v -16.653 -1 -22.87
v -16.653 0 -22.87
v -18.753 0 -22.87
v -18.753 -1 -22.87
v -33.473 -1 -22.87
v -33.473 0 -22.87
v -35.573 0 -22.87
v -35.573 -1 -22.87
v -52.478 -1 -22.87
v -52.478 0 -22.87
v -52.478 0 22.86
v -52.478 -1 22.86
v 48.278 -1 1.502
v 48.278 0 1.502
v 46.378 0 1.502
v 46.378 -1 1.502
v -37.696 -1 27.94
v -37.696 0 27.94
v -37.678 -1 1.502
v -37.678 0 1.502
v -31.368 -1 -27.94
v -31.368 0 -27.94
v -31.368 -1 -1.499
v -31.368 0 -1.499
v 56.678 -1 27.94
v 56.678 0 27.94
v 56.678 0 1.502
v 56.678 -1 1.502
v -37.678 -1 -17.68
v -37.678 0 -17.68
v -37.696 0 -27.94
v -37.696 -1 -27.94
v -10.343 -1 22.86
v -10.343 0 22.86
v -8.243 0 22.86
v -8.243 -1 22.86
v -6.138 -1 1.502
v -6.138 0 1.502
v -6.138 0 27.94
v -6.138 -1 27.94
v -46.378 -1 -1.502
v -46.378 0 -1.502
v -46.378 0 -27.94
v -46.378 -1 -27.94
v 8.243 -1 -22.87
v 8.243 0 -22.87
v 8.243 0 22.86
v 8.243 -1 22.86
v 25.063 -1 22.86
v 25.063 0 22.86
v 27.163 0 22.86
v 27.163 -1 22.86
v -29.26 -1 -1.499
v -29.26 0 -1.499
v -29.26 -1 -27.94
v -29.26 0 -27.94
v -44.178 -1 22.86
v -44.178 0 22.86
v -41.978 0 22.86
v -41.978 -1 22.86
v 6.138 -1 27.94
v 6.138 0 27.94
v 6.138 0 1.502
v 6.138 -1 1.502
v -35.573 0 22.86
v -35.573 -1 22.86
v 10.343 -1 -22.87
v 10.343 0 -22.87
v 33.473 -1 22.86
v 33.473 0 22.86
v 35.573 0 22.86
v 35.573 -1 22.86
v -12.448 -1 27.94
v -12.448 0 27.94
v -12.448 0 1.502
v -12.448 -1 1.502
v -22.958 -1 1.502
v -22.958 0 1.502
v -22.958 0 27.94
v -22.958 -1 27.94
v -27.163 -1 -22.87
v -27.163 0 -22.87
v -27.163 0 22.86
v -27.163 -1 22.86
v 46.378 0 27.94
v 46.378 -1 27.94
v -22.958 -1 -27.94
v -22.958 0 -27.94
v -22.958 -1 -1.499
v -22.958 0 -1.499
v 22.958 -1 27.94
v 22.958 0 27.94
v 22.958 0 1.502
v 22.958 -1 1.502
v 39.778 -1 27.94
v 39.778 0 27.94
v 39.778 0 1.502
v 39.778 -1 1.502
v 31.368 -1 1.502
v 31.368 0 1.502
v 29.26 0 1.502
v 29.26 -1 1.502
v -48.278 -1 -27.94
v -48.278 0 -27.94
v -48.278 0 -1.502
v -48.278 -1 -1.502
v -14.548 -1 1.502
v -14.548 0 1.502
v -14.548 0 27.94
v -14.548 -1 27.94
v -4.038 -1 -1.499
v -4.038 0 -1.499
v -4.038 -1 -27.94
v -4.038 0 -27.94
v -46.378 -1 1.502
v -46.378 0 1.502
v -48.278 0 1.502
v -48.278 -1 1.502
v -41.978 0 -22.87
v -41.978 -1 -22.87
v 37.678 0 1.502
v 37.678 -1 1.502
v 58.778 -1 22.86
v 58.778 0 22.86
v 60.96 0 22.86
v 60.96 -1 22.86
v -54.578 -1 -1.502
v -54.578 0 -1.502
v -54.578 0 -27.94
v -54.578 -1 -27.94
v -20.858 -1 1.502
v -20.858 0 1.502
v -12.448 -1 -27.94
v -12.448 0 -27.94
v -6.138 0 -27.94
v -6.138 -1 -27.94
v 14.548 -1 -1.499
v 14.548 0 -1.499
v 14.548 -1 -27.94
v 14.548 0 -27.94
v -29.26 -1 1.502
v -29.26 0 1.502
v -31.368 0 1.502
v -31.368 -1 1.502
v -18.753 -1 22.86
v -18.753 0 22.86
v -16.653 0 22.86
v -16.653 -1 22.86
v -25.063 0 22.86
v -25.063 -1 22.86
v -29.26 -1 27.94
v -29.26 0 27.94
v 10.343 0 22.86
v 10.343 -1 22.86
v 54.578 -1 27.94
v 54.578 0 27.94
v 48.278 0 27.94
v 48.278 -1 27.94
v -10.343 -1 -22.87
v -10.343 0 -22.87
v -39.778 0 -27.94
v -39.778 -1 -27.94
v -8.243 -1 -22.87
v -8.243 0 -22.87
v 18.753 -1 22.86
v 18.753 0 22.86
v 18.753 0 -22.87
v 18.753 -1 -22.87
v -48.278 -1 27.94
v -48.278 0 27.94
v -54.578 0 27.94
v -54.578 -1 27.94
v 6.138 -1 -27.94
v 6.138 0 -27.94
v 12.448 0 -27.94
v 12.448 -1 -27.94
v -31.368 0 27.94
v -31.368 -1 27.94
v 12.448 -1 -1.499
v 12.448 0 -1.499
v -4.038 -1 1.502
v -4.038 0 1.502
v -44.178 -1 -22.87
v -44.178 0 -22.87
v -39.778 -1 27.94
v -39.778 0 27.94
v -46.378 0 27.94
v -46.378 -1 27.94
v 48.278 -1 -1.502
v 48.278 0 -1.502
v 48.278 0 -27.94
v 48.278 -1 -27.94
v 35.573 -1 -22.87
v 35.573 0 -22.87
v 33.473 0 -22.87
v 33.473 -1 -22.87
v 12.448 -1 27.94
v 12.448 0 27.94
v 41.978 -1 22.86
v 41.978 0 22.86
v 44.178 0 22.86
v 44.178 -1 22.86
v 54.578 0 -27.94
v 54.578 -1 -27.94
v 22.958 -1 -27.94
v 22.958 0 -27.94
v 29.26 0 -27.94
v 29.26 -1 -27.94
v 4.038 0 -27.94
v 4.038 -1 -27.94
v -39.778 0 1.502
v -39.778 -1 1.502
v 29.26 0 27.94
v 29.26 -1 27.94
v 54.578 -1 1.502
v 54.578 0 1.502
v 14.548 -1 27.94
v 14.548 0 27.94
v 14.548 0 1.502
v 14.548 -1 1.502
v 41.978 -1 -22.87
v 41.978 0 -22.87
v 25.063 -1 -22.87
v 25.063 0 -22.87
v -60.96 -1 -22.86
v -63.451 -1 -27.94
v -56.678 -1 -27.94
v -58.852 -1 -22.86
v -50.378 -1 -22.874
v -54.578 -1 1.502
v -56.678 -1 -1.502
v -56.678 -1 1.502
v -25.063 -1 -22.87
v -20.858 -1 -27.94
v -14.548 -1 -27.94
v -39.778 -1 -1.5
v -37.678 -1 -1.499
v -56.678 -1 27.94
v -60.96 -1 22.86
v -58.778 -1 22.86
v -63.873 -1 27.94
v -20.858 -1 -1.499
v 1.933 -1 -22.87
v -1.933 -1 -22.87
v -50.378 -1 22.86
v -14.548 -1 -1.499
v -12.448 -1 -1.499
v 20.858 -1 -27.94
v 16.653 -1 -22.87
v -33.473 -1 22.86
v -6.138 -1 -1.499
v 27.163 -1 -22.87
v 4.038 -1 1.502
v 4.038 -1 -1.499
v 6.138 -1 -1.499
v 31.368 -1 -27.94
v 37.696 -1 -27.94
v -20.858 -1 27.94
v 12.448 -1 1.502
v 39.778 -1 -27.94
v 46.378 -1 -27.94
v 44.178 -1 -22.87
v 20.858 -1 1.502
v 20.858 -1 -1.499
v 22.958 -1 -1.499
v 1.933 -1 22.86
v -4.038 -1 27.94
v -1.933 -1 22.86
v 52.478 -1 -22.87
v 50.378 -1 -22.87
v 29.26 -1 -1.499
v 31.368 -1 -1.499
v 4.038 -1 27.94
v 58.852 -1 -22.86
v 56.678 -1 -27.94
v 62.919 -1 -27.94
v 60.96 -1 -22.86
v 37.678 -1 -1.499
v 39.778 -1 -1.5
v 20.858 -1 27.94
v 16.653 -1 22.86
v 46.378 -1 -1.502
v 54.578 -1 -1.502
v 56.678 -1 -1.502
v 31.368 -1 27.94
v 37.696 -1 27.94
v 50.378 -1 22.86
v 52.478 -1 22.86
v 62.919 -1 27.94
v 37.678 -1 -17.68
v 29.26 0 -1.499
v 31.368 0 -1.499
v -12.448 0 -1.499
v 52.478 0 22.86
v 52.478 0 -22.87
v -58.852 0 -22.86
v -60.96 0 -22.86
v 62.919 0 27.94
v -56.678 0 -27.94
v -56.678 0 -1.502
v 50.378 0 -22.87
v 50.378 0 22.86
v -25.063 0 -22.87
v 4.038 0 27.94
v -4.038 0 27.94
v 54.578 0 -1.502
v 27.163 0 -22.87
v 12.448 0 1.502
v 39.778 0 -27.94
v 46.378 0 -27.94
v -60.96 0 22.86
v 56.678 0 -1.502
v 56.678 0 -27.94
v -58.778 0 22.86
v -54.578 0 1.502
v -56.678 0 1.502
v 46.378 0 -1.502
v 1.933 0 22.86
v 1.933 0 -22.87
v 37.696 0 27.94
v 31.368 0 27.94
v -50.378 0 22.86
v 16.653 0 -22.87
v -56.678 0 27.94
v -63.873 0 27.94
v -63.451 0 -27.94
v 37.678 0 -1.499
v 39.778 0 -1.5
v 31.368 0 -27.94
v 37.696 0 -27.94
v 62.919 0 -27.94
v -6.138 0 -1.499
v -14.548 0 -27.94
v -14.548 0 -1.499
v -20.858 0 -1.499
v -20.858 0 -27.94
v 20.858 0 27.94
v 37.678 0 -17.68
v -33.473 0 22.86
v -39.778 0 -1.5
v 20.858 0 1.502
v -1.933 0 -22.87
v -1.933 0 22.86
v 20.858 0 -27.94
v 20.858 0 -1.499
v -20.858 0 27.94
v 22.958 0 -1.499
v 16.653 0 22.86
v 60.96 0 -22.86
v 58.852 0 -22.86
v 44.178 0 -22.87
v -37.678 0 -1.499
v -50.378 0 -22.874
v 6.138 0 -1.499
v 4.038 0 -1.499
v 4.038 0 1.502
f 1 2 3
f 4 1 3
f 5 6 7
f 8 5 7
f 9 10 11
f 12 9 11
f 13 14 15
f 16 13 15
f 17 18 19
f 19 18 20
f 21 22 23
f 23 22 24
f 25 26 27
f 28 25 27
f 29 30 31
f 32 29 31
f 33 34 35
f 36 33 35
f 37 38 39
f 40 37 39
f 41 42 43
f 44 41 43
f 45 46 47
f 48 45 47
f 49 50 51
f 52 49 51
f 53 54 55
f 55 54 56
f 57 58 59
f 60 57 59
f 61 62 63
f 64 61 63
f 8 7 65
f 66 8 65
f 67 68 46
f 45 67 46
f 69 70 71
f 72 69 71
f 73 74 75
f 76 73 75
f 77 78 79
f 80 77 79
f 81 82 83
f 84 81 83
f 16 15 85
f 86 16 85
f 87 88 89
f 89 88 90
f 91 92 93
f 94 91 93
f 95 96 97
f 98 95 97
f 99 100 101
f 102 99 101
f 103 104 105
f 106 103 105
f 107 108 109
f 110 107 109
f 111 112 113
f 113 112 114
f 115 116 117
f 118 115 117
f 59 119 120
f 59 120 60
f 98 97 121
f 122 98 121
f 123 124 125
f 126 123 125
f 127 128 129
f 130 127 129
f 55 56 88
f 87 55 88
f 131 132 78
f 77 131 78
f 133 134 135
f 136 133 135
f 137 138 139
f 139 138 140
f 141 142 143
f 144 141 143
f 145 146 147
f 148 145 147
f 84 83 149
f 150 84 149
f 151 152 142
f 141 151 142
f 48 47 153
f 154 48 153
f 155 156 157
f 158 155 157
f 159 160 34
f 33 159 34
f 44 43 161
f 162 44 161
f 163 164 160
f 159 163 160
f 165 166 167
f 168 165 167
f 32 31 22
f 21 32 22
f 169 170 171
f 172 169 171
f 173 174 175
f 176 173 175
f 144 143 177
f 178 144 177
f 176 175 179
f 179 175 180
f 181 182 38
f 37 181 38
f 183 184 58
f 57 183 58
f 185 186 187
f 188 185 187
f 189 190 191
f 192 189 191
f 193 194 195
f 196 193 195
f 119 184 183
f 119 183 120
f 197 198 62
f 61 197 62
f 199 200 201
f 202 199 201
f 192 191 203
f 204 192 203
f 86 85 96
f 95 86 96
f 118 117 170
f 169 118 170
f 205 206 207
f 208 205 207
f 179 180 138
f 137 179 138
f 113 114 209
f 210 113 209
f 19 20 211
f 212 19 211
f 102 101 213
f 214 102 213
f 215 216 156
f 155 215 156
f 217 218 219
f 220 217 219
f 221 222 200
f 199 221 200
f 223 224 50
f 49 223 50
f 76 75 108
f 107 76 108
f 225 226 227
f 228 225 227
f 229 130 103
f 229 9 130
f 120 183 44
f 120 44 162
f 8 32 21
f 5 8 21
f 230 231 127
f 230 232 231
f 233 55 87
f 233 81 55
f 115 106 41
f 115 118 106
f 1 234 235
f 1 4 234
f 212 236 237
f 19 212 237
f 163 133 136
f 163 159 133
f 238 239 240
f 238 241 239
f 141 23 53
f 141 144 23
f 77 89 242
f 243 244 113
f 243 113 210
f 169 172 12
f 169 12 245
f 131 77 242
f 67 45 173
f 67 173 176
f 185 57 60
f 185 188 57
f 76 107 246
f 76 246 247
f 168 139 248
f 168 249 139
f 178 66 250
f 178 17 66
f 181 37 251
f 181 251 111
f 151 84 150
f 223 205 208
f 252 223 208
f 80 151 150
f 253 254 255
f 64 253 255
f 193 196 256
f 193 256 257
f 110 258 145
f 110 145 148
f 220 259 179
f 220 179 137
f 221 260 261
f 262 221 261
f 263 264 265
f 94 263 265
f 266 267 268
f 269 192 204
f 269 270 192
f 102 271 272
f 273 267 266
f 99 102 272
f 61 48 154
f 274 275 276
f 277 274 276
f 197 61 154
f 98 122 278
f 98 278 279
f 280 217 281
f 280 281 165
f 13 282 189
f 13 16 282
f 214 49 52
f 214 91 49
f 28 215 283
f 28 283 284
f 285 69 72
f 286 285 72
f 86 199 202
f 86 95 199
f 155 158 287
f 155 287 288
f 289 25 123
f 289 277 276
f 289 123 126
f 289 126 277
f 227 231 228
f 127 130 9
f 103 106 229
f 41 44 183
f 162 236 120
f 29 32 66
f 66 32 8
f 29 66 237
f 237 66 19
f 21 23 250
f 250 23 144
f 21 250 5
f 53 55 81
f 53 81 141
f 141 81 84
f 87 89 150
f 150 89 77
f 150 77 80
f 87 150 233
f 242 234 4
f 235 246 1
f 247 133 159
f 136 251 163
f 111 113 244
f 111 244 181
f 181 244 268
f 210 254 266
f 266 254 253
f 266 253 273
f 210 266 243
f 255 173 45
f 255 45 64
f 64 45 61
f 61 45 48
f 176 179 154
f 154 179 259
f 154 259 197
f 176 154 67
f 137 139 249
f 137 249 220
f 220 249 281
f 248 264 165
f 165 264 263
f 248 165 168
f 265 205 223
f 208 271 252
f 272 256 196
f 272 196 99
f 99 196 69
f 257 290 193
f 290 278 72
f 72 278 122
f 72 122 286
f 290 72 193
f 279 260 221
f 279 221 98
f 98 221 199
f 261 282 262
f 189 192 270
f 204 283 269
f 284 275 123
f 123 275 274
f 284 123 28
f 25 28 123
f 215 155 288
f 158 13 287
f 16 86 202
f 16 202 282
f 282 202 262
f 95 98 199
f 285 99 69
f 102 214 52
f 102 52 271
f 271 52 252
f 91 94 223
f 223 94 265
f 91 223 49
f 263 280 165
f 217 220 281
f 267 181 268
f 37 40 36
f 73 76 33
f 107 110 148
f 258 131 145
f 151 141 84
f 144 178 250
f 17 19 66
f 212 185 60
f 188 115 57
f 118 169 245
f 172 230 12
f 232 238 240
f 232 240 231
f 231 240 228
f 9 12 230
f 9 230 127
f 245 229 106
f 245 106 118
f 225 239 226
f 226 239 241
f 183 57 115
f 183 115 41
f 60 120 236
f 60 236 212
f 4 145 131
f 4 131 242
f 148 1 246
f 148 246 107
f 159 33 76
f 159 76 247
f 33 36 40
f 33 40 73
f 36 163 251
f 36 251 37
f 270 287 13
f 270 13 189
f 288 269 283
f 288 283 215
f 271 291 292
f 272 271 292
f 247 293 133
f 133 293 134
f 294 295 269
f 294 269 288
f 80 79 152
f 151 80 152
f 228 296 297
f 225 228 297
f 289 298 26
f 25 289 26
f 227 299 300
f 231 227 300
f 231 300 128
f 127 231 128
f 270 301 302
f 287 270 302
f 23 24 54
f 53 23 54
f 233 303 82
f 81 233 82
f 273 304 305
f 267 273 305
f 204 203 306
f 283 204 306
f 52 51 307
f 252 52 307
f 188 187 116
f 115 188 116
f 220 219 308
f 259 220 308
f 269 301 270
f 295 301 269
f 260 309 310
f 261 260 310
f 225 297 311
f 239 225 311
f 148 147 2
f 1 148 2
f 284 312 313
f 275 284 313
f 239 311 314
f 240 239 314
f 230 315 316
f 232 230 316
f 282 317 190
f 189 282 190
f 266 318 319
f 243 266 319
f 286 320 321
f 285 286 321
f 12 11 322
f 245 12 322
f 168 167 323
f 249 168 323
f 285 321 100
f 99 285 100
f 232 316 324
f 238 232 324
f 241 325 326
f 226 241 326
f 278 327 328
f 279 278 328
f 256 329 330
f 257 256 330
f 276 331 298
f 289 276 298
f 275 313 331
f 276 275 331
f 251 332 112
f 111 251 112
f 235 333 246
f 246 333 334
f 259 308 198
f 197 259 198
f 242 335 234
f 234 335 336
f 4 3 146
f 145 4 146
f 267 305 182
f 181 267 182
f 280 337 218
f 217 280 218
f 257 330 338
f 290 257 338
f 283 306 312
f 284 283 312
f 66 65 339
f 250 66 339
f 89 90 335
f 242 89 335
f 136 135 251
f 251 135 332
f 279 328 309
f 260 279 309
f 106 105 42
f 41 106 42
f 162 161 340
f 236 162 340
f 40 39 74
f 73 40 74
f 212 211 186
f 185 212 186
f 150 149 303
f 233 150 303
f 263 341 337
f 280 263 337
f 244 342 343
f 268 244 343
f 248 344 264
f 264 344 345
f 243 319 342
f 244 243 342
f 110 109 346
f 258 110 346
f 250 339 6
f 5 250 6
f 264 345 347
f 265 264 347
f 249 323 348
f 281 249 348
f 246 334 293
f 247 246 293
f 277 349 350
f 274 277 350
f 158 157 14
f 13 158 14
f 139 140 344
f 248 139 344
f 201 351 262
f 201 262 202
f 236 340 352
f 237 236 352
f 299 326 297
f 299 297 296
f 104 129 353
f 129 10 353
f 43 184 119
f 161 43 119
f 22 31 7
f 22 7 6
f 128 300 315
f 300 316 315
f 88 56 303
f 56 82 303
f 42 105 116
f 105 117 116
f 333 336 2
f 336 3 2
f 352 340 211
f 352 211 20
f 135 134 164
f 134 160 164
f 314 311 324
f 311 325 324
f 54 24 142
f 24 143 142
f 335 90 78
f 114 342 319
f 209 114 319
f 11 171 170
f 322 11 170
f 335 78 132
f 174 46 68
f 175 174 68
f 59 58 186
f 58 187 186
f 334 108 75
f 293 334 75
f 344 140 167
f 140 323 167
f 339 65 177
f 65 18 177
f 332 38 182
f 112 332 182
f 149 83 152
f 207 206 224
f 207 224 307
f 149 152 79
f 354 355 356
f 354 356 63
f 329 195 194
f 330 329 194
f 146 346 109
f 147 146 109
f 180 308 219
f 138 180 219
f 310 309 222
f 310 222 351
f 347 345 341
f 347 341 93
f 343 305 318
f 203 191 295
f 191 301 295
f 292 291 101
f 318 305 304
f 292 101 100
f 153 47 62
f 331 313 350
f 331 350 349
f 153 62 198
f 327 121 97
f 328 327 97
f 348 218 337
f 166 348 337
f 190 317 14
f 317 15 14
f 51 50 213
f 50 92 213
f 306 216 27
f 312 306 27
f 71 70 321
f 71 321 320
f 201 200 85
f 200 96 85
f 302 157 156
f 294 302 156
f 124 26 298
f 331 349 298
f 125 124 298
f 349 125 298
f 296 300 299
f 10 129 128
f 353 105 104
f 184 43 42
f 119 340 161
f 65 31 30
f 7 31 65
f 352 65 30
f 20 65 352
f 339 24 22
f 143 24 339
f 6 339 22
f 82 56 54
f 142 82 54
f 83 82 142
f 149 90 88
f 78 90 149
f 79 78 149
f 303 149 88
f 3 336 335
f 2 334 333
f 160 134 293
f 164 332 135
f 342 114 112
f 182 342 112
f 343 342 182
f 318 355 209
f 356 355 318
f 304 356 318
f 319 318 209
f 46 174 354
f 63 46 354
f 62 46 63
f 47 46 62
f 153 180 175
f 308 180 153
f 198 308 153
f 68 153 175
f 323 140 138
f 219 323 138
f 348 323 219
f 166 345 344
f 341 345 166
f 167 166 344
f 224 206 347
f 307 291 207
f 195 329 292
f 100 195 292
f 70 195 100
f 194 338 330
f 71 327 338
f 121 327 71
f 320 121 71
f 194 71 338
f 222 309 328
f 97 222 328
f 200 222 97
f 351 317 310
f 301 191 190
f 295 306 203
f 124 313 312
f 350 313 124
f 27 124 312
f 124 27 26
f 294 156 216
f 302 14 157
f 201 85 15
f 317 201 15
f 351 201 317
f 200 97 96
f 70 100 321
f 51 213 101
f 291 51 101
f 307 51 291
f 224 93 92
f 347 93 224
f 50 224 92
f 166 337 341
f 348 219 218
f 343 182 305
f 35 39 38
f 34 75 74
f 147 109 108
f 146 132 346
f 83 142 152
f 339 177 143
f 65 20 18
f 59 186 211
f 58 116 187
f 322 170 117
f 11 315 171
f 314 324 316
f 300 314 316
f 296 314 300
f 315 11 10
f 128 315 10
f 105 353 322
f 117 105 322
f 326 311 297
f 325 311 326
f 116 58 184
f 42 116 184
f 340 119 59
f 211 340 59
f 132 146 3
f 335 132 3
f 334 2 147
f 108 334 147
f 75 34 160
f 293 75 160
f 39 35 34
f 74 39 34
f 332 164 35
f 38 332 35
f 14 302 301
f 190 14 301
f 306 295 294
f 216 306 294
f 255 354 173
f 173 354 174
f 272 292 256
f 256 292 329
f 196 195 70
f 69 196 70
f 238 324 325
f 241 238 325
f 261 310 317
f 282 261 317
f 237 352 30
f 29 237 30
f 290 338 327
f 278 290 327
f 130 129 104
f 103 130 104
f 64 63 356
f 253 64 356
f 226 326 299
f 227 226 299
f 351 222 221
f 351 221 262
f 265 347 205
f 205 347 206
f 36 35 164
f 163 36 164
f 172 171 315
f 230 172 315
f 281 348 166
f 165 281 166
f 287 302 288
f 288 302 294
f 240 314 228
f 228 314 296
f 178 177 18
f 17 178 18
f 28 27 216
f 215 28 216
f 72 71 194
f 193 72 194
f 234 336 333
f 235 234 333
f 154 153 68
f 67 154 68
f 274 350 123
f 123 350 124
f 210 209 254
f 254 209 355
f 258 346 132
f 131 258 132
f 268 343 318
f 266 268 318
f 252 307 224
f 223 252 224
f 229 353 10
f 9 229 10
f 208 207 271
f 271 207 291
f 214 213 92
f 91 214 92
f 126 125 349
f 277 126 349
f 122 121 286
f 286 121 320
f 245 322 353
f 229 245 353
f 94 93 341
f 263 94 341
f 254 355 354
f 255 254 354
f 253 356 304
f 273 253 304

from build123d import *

# Parameters (mm, degrees)
F0_W     = 2.2
F0_H     = 45.730288
F0_W_2   = 2.1
F1_DEPTH = 1


with BuildPart() as f1:
    # F0 (on Front) → F1 (new body)
    with BuildSketch(Plane.XZ):
        Polygon((-60.96, 27.94), (-63.872576, 27.94), (-63.45094, -27.94), (-60.96, -27.94), (-58.86, -27.94), (-58.8518, -27.94), (-56.678003, -27.94), (-56.678003, -1.502051), (-54.578005, -1.502051), (-54.578005, -27.94), (-52.478005, -27.94), (-50.378005, -27.94), (-48.278005, -27.94), (-48.278005, -1.502051), (-46.378005, -1.502051), (-46.378005, -22.870288), (-46.378005, -27.94), (-44.178005, -27.94), (-41.978005, -27.94), (-39.778005, -27.94), (-39.778005, -1.5), (-37.678009, -1.4986), (-37.678009, -17.679542), (-37.695634, -27.94), (-31.367925, -27.94), (-31.367925, -1.4986), (-29.259725, -1.4986), (-29.259725, -27.94), (-22.957845, -27.94), (-22.957845, -1.4986), (-20.857845, -1.4986), (-20.857845, -27.94), (-14.547765, -27.94), (-14.547765, -1.4986), (-12.447765, -1.4986), (-12.447765, -27.94), (-6.137685, -27.94), (-6.137685, -1.4986), (-4.037685, -1.4986), (-4.037685, -27.94), (4.037685, -27.94), (4.037685, -1.4986), (6.137685, -1.4986), (6.137685, -27.94), (12.447765, -27.94), (12.447765, -1.4986), (14.547765, -1.4986), (14.547765, -27.94), (20.857845, -27.94), (20.857845, -1.4986), (22.957845, -1.4986), (22.957845, -27.94), (29.259725, -27.94), (29.259725, -1.4986), (31.367925, -1.4986), (31.367925, -27.94), (37.695634, -27.94), (37.678009, -17.679542), (37.678009, -1.4986), (39.778005, -1.5), (39.778005, -27.94), (46.378005, -27.94), (46.378005, -1.502051), (48.278005, -1.502051), (48.278005, -27.94), (54.578005, -27.94), (54.578005, -1.502051), (56.678003, -1.502051), (56.678003, -27.94), (62.918797, -27.94), (62.918797, 27.94), (56.678003, 27.94), (56.678003, 1.502051), (54.578005, 1.502051), (54.578005, 27.94), (48.278005, 27.94), (48.278005, 1.502051), (46.378005, 1.502051), (46.378005, 27.94), (39.778005, 27.94), (39.778005, 22.86), (39.778005, 1.502051), (37.678009, 1.502051), (37.695634, 27.94), (31.367925, 27.94), (31.367925, 22.86), (31.367925, 1.502051), (29.259725, 1.502051), (29.259725, 27.94), (22.957845, 27.94), (22.957845, 22.86), (22.957845, 1.502051), (20.857845, 1.502051), (20.857845, 27.94), (14.547765, 27.94), (14.547765, 22.86), (14.547765, 1.502051), (12.447765, 1.502051), (12.447765, 27.94), (6.137685, 27.94), (6.137685, 22.86), (6.137685, 1.502051), (4.037685, 1.502051), (4.037685, 27.94), (-4.037685, 27.94), (-4.037685, 1.502051), (-6.137685, 1.502051), (-6.137685, 22.86), (-6.137685, 27.94), (-12.447765, 27.94), (-12.447765, 1.502051), (-14.547765, 1.502051), (-14.547765, 22.86), (-14.547765, 27.94), (-20.857845, 27.94), (-20.857845, 1.502051), (-22.957845, 1.502051), (-22.957845, 22.86), (-22.957845, 27.94), (-29.259725, 27.94), (-29.259725, 1.502051), (-31.367925, 1.502051), (-31.367925, 22.86), (-31.367925, 27.94), (-34.921541, 27.94), (-37.695634, 27.94), (-37.678009, 1.502051), (-39.778005, 1.502051), (-39.778005, 22.86), (-39.778005, 27.94), (-41.978005, 27.94), (-44.178005, 27.94), (-46.378005, 27.94), (-46.378005, 22.86), (-46.378005, 1.502051), (-48.278005, 1.502051), (-48.278005, 27.94), (-50.378005, 27.94), (-52.478005, 27.94), (-54.578005, 27.94), (-54.578005, 1.502051), (-56.678003, 1.502051), (-56.678003, 19.27661), (-56.678003, 27.94), (-58.7698, 27.94), (-58.86, 27.94), align=None)
        Polygon((-52.478005, 22.86), (-50.378005, 22.86), (-50.378005, -22.870288), (-50.378005, -22.873678), (-52.478005, -22.870288), align=None, mode=Mode.SUBTRACT)
        with Locations((-43.078005, -0.005144)):
            Rectangle(F0_W, F0_H, mode=Mode.SUBTRACT)
        Polygon((-35.572965, 17.750787), (-35.572965, 22.86), (-33.472965, 22.86), (-33.472965, -22.870288), (-35.572965, -22.870288), align=None, mode=Mode.SUBTRACT)
        Polygon((-27.162885, -22.870288), (-27.162885, 17.750787), (-27.162885, 22.86), (-25.062885, 22.86), (-25.062885, -22.870288), align=None, mode=Mode.SUBTRACT)
        Polygon((-18.752805, -22.870288), (-18.752805, 17.750787), (-18.752805, 22.86), (-16.652805, 22.86), (-16.652805, -22.870288), align=None, mode=Mode.SUBTRACT)
        Polygon((-10.342725, -22.870288), (-10.342725, 17.750787), (-10.342725, 22.86), (-8.242725, 22.86), (-8.242725, -22.870288), align=None, mode=Mode.SUBTRACT)
        Polygon((-1.932645, -22.870288), (-1.932645, 17.750787), (-1.932645, 22.86), (0, 22.86), (1.932645, 22.86), (1.932645, 17.750787), (1.932645, -22.870288), (0, -22.870288), align=None, mode=Mode.SUBTRACT)
        Polygon((8.242725, -22.870288), (8.242725, 22.86), (10.342725, 22.86), (10.342725, 17.750787), (10.342725, -22.870288), align=None, mode=Mode.SUBTRACT)
        Polygon((16.652805, 22.86), (18.752805, 22.86), (18.752805, 17.750787), (18.752805, -22.870288), (16.652805, -22.870288), align=None, mode=Mode.SUBTRACT)
        Polygon((25.062885, 22.86), (27.162885, 22.86), (27.162885, 17.750787), (27.162885, -22.870288), (25.062885, -22.870288), align=None, mode=Mode.SUBTRACT)
        Polygon((35.572965, -22.870288), (33.472965, -22.870288), (33.472965, 22.86), (35.572965, 22.86), (35.572965, 17.750787), align=None, mode=Mode.SUBTRACT)
        with Locations((43.078005, -0.005144)):
            Rectangle(F0_W, F0_H, mode=Mode.SUBTRACT)
        with Locations((51.428005, -0.005144)):
            Rectangle(F0_W_2, F0_H, mode=Mode.SUBTRACT)
        Polygon((-60.96, -22.86), (-60.96, 22.86), (-58.778, 22.86), (-58.8518, -22.86), align=None, mode=Mode.SUBTRACT)
        Polygon((58.778, 22.86), (60.96, 22.86), (60.96, -22.86), (58.8518, -22.86), align=None, mode=Mode.SUBTRACT)
    extrude(amount=F1_DEPTH)


solid = f1.part
